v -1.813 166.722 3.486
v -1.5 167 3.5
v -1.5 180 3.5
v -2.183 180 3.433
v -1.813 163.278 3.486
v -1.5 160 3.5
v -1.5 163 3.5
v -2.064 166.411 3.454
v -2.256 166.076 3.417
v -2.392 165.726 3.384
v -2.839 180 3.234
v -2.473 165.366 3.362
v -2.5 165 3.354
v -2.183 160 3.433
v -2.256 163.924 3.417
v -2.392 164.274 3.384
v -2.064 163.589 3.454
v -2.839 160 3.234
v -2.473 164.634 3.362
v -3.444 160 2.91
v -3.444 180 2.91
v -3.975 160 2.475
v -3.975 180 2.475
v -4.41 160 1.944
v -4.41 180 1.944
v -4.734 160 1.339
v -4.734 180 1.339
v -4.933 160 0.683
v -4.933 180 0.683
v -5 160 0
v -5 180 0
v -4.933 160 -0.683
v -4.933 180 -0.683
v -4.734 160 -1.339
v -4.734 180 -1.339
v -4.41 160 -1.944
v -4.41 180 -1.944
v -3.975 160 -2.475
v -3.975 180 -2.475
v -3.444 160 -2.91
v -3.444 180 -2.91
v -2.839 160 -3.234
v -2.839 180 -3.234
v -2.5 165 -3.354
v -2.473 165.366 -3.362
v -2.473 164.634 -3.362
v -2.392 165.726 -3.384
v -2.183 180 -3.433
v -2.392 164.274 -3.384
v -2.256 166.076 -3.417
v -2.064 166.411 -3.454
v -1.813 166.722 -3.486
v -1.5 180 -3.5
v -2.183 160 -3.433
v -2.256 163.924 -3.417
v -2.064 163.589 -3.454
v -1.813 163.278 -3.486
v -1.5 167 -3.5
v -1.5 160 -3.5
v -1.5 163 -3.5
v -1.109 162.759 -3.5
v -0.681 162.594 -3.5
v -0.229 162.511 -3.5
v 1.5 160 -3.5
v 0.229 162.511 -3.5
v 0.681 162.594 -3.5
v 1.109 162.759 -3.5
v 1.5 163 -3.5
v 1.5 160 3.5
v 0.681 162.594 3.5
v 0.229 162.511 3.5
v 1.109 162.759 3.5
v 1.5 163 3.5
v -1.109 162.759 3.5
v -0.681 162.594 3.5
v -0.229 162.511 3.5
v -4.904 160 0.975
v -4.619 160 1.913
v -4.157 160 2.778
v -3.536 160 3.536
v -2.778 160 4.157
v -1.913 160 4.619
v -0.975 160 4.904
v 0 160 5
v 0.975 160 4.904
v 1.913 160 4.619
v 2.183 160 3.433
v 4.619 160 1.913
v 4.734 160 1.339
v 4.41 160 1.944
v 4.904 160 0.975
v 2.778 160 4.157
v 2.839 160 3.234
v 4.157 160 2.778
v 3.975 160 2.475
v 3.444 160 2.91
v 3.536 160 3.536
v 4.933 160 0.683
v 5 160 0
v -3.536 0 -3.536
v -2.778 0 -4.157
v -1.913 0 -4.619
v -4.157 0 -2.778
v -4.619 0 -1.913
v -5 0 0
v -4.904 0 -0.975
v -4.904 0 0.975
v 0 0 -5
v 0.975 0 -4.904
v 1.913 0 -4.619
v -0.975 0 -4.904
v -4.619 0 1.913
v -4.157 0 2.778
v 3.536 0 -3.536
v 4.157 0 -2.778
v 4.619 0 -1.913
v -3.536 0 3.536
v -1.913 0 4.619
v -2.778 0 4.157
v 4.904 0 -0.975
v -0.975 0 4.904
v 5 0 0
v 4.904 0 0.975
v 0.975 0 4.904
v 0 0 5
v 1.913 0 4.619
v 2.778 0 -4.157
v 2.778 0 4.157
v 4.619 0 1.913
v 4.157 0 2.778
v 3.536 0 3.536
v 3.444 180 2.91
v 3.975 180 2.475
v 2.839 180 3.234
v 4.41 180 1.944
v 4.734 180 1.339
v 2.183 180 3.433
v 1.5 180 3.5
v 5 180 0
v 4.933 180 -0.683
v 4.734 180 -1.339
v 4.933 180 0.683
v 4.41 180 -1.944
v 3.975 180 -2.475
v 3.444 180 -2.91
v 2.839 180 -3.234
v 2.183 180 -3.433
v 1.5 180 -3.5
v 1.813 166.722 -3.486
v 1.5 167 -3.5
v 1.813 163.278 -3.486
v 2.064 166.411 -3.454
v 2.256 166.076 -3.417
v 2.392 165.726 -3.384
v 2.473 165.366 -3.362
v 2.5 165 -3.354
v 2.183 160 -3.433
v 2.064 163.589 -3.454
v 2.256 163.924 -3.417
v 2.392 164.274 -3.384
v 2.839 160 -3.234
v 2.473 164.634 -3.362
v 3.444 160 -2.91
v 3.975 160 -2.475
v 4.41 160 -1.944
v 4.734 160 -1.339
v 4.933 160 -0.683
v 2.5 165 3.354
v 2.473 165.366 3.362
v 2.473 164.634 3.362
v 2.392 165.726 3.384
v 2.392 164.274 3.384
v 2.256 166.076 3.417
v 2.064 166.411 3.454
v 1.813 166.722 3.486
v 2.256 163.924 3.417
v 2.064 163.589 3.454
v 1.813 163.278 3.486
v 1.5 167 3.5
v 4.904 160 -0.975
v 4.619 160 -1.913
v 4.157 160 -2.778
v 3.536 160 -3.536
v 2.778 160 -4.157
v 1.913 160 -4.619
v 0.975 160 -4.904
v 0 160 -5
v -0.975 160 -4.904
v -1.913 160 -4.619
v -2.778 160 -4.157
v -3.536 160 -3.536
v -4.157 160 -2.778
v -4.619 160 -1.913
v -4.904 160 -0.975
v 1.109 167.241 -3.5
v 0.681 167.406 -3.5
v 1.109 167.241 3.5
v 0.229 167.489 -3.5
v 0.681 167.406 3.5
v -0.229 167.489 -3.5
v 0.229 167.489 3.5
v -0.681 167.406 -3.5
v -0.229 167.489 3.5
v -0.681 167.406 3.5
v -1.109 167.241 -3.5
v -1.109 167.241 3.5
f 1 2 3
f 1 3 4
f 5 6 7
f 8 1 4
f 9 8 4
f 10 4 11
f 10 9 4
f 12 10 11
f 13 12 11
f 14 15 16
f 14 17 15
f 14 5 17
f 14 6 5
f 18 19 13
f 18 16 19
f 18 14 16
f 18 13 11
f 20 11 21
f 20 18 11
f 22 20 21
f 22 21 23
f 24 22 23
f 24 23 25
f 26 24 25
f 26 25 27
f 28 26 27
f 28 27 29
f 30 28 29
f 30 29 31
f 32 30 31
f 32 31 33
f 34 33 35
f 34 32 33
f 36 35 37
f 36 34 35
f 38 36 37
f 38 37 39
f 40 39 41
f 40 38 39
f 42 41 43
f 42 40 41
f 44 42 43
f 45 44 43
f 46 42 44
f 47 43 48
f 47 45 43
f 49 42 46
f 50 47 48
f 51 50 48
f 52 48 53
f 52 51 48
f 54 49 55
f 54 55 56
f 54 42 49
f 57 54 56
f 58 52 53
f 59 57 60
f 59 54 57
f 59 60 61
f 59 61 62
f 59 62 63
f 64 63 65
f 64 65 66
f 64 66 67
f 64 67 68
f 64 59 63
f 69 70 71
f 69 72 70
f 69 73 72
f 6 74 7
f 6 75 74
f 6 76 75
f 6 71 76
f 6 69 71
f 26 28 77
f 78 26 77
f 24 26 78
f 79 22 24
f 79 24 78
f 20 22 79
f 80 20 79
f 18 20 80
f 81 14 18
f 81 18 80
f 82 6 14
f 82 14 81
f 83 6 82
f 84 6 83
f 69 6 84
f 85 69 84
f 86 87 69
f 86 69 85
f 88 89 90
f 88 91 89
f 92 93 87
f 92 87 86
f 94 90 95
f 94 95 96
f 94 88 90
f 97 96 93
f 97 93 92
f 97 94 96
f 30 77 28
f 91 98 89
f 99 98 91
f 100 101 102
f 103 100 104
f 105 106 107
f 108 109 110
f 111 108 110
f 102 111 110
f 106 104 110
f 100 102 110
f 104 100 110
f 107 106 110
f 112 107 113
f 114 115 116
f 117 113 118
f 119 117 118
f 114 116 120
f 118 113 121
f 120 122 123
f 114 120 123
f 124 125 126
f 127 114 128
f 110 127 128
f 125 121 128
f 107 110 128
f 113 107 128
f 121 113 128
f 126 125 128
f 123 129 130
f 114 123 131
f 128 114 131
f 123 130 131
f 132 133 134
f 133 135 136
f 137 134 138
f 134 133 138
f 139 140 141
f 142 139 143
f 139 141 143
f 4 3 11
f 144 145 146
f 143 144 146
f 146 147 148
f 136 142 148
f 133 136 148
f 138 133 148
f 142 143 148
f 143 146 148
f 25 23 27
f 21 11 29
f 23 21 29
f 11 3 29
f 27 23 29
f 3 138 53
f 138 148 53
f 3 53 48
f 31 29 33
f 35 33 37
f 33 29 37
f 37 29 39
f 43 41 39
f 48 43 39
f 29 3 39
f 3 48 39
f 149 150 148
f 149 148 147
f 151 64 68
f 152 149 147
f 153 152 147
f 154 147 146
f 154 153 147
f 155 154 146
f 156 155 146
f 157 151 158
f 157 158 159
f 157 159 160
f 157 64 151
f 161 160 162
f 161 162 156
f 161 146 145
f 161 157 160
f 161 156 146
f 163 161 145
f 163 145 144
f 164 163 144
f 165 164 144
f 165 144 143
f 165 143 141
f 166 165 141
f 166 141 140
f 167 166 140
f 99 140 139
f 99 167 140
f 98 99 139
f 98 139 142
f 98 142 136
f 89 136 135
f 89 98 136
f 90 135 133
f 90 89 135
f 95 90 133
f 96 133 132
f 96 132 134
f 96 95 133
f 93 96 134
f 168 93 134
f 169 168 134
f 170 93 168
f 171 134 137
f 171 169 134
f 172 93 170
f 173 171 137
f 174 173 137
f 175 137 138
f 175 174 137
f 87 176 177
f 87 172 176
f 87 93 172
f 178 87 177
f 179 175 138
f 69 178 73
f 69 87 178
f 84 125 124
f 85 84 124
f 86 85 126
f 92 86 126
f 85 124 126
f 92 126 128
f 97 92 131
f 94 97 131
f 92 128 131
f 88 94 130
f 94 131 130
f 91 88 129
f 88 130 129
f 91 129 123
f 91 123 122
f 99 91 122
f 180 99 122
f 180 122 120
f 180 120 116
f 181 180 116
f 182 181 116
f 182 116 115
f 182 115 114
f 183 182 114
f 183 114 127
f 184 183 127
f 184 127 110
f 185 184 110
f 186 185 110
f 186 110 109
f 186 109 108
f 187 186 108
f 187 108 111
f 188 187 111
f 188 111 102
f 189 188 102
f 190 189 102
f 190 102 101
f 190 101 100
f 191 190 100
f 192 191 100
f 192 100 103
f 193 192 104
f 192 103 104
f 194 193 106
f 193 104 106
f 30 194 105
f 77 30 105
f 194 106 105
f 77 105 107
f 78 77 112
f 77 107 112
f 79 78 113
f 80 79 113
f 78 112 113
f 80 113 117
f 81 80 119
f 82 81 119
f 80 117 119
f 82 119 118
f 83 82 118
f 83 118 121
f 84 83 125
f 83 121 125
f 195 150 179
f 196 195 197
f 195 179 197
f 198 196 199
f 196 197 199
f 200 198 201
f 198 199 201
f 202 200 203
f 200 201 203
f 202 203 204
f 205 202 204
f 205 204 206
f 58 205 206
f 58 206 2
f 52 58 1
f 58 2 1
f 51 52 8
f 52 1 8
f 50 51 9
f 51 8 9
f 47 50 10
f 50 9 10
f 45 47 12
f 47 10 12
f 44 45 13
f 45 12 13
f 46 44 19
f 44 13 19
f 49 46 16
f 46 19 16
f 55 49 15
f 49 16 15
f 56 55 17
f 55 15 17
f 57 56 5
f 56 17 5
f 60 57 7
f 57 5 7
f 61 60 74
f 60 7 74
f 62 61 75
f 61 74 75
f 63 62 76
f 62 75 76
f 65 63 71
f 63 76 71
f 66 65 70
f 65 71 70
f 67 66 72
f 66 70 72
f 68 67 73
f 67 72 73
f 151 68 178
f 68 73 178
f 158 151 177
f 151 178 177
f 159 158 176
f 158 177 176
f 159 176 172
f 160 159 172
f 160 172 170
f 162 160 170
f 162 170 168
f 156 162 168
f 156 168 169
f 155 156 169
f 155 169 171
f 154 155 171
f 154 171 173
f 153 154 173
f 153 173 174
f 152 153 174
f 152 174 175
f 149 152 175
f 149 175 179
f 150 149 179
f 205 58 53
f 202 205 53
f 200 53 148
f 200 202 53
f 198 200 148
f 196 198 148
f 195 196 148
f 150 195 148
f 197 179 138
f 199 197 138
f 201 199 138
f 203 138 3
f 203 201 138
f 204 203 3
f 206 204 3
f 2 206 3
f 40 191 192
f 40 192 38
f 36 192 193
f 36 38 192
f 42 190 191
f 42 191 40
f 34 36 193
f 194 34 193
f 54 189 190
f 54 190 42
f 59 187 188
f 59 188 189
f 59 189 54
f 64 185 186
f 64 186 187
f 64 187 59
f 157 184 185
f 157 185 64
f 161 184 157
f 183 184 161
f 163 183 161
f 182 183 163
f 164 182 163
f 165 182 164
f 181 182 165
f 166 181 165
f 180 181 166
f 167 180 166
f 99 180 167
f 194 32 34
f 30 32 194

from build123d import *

# Parameters (mm, degrees)
SKETCH1_R           = 5
BOSS_EXTRUDE1_DEPTH = 160
BOSS_EXTRUDE2_DEPTH = 20
SKETCH3_R           = 2.5
CUT_EXTRUDE1_DEPTH  = 10


with BuildPart() as part:
    # Sketch1 → Boss-Extrude1 (new body)
    with BuildSketch(Plane(origin=(0, 0, 0), x_dir=(1, 0, 0), z_dir=(0, 1, 0))):
        with Locations(Location((0, 0, 0), (0, 0, 270))):
            Circle(SKETCH1_R)
    extrude(amount=BOSS_EXTRUDE1_DEPTH)

    # Sketch2 → Boss-Extrude2 (add)
    with BuildSketch(Plane(origin=(0, 160, 0), x_dir=(1, 0, 0), z_dir=(0, 1, 0))):
        with BuildLine():
            Line((1.5, -3.5), (-1.5, -3.5))
            ThreePointArc((-1.5, -3.5), (-5, 0), (-1.5, 3.5))
            Line((-1.5, 3.5), (1.5, 3.5))
            ThreePointArc((1.5, 3.5), (5, 0), (1.5, -3.5))
        make_face()
    extrude(amount=BOSS_EXTRUDE2_DEPTH)

    # Sketch3 → Cut-Extrude1 (cut)
    with BuildSketch(Plane.XY.offset(3.5)):
        with Locations(Location((0, 165, 0), (0, 0, 53.130102354))):
            Circle(SKETCH3_R)
    extrude(amount=-CUT_EXTRUDE1_DEPTH, mode=Mode.SUBTRACT)


solid = part.part
